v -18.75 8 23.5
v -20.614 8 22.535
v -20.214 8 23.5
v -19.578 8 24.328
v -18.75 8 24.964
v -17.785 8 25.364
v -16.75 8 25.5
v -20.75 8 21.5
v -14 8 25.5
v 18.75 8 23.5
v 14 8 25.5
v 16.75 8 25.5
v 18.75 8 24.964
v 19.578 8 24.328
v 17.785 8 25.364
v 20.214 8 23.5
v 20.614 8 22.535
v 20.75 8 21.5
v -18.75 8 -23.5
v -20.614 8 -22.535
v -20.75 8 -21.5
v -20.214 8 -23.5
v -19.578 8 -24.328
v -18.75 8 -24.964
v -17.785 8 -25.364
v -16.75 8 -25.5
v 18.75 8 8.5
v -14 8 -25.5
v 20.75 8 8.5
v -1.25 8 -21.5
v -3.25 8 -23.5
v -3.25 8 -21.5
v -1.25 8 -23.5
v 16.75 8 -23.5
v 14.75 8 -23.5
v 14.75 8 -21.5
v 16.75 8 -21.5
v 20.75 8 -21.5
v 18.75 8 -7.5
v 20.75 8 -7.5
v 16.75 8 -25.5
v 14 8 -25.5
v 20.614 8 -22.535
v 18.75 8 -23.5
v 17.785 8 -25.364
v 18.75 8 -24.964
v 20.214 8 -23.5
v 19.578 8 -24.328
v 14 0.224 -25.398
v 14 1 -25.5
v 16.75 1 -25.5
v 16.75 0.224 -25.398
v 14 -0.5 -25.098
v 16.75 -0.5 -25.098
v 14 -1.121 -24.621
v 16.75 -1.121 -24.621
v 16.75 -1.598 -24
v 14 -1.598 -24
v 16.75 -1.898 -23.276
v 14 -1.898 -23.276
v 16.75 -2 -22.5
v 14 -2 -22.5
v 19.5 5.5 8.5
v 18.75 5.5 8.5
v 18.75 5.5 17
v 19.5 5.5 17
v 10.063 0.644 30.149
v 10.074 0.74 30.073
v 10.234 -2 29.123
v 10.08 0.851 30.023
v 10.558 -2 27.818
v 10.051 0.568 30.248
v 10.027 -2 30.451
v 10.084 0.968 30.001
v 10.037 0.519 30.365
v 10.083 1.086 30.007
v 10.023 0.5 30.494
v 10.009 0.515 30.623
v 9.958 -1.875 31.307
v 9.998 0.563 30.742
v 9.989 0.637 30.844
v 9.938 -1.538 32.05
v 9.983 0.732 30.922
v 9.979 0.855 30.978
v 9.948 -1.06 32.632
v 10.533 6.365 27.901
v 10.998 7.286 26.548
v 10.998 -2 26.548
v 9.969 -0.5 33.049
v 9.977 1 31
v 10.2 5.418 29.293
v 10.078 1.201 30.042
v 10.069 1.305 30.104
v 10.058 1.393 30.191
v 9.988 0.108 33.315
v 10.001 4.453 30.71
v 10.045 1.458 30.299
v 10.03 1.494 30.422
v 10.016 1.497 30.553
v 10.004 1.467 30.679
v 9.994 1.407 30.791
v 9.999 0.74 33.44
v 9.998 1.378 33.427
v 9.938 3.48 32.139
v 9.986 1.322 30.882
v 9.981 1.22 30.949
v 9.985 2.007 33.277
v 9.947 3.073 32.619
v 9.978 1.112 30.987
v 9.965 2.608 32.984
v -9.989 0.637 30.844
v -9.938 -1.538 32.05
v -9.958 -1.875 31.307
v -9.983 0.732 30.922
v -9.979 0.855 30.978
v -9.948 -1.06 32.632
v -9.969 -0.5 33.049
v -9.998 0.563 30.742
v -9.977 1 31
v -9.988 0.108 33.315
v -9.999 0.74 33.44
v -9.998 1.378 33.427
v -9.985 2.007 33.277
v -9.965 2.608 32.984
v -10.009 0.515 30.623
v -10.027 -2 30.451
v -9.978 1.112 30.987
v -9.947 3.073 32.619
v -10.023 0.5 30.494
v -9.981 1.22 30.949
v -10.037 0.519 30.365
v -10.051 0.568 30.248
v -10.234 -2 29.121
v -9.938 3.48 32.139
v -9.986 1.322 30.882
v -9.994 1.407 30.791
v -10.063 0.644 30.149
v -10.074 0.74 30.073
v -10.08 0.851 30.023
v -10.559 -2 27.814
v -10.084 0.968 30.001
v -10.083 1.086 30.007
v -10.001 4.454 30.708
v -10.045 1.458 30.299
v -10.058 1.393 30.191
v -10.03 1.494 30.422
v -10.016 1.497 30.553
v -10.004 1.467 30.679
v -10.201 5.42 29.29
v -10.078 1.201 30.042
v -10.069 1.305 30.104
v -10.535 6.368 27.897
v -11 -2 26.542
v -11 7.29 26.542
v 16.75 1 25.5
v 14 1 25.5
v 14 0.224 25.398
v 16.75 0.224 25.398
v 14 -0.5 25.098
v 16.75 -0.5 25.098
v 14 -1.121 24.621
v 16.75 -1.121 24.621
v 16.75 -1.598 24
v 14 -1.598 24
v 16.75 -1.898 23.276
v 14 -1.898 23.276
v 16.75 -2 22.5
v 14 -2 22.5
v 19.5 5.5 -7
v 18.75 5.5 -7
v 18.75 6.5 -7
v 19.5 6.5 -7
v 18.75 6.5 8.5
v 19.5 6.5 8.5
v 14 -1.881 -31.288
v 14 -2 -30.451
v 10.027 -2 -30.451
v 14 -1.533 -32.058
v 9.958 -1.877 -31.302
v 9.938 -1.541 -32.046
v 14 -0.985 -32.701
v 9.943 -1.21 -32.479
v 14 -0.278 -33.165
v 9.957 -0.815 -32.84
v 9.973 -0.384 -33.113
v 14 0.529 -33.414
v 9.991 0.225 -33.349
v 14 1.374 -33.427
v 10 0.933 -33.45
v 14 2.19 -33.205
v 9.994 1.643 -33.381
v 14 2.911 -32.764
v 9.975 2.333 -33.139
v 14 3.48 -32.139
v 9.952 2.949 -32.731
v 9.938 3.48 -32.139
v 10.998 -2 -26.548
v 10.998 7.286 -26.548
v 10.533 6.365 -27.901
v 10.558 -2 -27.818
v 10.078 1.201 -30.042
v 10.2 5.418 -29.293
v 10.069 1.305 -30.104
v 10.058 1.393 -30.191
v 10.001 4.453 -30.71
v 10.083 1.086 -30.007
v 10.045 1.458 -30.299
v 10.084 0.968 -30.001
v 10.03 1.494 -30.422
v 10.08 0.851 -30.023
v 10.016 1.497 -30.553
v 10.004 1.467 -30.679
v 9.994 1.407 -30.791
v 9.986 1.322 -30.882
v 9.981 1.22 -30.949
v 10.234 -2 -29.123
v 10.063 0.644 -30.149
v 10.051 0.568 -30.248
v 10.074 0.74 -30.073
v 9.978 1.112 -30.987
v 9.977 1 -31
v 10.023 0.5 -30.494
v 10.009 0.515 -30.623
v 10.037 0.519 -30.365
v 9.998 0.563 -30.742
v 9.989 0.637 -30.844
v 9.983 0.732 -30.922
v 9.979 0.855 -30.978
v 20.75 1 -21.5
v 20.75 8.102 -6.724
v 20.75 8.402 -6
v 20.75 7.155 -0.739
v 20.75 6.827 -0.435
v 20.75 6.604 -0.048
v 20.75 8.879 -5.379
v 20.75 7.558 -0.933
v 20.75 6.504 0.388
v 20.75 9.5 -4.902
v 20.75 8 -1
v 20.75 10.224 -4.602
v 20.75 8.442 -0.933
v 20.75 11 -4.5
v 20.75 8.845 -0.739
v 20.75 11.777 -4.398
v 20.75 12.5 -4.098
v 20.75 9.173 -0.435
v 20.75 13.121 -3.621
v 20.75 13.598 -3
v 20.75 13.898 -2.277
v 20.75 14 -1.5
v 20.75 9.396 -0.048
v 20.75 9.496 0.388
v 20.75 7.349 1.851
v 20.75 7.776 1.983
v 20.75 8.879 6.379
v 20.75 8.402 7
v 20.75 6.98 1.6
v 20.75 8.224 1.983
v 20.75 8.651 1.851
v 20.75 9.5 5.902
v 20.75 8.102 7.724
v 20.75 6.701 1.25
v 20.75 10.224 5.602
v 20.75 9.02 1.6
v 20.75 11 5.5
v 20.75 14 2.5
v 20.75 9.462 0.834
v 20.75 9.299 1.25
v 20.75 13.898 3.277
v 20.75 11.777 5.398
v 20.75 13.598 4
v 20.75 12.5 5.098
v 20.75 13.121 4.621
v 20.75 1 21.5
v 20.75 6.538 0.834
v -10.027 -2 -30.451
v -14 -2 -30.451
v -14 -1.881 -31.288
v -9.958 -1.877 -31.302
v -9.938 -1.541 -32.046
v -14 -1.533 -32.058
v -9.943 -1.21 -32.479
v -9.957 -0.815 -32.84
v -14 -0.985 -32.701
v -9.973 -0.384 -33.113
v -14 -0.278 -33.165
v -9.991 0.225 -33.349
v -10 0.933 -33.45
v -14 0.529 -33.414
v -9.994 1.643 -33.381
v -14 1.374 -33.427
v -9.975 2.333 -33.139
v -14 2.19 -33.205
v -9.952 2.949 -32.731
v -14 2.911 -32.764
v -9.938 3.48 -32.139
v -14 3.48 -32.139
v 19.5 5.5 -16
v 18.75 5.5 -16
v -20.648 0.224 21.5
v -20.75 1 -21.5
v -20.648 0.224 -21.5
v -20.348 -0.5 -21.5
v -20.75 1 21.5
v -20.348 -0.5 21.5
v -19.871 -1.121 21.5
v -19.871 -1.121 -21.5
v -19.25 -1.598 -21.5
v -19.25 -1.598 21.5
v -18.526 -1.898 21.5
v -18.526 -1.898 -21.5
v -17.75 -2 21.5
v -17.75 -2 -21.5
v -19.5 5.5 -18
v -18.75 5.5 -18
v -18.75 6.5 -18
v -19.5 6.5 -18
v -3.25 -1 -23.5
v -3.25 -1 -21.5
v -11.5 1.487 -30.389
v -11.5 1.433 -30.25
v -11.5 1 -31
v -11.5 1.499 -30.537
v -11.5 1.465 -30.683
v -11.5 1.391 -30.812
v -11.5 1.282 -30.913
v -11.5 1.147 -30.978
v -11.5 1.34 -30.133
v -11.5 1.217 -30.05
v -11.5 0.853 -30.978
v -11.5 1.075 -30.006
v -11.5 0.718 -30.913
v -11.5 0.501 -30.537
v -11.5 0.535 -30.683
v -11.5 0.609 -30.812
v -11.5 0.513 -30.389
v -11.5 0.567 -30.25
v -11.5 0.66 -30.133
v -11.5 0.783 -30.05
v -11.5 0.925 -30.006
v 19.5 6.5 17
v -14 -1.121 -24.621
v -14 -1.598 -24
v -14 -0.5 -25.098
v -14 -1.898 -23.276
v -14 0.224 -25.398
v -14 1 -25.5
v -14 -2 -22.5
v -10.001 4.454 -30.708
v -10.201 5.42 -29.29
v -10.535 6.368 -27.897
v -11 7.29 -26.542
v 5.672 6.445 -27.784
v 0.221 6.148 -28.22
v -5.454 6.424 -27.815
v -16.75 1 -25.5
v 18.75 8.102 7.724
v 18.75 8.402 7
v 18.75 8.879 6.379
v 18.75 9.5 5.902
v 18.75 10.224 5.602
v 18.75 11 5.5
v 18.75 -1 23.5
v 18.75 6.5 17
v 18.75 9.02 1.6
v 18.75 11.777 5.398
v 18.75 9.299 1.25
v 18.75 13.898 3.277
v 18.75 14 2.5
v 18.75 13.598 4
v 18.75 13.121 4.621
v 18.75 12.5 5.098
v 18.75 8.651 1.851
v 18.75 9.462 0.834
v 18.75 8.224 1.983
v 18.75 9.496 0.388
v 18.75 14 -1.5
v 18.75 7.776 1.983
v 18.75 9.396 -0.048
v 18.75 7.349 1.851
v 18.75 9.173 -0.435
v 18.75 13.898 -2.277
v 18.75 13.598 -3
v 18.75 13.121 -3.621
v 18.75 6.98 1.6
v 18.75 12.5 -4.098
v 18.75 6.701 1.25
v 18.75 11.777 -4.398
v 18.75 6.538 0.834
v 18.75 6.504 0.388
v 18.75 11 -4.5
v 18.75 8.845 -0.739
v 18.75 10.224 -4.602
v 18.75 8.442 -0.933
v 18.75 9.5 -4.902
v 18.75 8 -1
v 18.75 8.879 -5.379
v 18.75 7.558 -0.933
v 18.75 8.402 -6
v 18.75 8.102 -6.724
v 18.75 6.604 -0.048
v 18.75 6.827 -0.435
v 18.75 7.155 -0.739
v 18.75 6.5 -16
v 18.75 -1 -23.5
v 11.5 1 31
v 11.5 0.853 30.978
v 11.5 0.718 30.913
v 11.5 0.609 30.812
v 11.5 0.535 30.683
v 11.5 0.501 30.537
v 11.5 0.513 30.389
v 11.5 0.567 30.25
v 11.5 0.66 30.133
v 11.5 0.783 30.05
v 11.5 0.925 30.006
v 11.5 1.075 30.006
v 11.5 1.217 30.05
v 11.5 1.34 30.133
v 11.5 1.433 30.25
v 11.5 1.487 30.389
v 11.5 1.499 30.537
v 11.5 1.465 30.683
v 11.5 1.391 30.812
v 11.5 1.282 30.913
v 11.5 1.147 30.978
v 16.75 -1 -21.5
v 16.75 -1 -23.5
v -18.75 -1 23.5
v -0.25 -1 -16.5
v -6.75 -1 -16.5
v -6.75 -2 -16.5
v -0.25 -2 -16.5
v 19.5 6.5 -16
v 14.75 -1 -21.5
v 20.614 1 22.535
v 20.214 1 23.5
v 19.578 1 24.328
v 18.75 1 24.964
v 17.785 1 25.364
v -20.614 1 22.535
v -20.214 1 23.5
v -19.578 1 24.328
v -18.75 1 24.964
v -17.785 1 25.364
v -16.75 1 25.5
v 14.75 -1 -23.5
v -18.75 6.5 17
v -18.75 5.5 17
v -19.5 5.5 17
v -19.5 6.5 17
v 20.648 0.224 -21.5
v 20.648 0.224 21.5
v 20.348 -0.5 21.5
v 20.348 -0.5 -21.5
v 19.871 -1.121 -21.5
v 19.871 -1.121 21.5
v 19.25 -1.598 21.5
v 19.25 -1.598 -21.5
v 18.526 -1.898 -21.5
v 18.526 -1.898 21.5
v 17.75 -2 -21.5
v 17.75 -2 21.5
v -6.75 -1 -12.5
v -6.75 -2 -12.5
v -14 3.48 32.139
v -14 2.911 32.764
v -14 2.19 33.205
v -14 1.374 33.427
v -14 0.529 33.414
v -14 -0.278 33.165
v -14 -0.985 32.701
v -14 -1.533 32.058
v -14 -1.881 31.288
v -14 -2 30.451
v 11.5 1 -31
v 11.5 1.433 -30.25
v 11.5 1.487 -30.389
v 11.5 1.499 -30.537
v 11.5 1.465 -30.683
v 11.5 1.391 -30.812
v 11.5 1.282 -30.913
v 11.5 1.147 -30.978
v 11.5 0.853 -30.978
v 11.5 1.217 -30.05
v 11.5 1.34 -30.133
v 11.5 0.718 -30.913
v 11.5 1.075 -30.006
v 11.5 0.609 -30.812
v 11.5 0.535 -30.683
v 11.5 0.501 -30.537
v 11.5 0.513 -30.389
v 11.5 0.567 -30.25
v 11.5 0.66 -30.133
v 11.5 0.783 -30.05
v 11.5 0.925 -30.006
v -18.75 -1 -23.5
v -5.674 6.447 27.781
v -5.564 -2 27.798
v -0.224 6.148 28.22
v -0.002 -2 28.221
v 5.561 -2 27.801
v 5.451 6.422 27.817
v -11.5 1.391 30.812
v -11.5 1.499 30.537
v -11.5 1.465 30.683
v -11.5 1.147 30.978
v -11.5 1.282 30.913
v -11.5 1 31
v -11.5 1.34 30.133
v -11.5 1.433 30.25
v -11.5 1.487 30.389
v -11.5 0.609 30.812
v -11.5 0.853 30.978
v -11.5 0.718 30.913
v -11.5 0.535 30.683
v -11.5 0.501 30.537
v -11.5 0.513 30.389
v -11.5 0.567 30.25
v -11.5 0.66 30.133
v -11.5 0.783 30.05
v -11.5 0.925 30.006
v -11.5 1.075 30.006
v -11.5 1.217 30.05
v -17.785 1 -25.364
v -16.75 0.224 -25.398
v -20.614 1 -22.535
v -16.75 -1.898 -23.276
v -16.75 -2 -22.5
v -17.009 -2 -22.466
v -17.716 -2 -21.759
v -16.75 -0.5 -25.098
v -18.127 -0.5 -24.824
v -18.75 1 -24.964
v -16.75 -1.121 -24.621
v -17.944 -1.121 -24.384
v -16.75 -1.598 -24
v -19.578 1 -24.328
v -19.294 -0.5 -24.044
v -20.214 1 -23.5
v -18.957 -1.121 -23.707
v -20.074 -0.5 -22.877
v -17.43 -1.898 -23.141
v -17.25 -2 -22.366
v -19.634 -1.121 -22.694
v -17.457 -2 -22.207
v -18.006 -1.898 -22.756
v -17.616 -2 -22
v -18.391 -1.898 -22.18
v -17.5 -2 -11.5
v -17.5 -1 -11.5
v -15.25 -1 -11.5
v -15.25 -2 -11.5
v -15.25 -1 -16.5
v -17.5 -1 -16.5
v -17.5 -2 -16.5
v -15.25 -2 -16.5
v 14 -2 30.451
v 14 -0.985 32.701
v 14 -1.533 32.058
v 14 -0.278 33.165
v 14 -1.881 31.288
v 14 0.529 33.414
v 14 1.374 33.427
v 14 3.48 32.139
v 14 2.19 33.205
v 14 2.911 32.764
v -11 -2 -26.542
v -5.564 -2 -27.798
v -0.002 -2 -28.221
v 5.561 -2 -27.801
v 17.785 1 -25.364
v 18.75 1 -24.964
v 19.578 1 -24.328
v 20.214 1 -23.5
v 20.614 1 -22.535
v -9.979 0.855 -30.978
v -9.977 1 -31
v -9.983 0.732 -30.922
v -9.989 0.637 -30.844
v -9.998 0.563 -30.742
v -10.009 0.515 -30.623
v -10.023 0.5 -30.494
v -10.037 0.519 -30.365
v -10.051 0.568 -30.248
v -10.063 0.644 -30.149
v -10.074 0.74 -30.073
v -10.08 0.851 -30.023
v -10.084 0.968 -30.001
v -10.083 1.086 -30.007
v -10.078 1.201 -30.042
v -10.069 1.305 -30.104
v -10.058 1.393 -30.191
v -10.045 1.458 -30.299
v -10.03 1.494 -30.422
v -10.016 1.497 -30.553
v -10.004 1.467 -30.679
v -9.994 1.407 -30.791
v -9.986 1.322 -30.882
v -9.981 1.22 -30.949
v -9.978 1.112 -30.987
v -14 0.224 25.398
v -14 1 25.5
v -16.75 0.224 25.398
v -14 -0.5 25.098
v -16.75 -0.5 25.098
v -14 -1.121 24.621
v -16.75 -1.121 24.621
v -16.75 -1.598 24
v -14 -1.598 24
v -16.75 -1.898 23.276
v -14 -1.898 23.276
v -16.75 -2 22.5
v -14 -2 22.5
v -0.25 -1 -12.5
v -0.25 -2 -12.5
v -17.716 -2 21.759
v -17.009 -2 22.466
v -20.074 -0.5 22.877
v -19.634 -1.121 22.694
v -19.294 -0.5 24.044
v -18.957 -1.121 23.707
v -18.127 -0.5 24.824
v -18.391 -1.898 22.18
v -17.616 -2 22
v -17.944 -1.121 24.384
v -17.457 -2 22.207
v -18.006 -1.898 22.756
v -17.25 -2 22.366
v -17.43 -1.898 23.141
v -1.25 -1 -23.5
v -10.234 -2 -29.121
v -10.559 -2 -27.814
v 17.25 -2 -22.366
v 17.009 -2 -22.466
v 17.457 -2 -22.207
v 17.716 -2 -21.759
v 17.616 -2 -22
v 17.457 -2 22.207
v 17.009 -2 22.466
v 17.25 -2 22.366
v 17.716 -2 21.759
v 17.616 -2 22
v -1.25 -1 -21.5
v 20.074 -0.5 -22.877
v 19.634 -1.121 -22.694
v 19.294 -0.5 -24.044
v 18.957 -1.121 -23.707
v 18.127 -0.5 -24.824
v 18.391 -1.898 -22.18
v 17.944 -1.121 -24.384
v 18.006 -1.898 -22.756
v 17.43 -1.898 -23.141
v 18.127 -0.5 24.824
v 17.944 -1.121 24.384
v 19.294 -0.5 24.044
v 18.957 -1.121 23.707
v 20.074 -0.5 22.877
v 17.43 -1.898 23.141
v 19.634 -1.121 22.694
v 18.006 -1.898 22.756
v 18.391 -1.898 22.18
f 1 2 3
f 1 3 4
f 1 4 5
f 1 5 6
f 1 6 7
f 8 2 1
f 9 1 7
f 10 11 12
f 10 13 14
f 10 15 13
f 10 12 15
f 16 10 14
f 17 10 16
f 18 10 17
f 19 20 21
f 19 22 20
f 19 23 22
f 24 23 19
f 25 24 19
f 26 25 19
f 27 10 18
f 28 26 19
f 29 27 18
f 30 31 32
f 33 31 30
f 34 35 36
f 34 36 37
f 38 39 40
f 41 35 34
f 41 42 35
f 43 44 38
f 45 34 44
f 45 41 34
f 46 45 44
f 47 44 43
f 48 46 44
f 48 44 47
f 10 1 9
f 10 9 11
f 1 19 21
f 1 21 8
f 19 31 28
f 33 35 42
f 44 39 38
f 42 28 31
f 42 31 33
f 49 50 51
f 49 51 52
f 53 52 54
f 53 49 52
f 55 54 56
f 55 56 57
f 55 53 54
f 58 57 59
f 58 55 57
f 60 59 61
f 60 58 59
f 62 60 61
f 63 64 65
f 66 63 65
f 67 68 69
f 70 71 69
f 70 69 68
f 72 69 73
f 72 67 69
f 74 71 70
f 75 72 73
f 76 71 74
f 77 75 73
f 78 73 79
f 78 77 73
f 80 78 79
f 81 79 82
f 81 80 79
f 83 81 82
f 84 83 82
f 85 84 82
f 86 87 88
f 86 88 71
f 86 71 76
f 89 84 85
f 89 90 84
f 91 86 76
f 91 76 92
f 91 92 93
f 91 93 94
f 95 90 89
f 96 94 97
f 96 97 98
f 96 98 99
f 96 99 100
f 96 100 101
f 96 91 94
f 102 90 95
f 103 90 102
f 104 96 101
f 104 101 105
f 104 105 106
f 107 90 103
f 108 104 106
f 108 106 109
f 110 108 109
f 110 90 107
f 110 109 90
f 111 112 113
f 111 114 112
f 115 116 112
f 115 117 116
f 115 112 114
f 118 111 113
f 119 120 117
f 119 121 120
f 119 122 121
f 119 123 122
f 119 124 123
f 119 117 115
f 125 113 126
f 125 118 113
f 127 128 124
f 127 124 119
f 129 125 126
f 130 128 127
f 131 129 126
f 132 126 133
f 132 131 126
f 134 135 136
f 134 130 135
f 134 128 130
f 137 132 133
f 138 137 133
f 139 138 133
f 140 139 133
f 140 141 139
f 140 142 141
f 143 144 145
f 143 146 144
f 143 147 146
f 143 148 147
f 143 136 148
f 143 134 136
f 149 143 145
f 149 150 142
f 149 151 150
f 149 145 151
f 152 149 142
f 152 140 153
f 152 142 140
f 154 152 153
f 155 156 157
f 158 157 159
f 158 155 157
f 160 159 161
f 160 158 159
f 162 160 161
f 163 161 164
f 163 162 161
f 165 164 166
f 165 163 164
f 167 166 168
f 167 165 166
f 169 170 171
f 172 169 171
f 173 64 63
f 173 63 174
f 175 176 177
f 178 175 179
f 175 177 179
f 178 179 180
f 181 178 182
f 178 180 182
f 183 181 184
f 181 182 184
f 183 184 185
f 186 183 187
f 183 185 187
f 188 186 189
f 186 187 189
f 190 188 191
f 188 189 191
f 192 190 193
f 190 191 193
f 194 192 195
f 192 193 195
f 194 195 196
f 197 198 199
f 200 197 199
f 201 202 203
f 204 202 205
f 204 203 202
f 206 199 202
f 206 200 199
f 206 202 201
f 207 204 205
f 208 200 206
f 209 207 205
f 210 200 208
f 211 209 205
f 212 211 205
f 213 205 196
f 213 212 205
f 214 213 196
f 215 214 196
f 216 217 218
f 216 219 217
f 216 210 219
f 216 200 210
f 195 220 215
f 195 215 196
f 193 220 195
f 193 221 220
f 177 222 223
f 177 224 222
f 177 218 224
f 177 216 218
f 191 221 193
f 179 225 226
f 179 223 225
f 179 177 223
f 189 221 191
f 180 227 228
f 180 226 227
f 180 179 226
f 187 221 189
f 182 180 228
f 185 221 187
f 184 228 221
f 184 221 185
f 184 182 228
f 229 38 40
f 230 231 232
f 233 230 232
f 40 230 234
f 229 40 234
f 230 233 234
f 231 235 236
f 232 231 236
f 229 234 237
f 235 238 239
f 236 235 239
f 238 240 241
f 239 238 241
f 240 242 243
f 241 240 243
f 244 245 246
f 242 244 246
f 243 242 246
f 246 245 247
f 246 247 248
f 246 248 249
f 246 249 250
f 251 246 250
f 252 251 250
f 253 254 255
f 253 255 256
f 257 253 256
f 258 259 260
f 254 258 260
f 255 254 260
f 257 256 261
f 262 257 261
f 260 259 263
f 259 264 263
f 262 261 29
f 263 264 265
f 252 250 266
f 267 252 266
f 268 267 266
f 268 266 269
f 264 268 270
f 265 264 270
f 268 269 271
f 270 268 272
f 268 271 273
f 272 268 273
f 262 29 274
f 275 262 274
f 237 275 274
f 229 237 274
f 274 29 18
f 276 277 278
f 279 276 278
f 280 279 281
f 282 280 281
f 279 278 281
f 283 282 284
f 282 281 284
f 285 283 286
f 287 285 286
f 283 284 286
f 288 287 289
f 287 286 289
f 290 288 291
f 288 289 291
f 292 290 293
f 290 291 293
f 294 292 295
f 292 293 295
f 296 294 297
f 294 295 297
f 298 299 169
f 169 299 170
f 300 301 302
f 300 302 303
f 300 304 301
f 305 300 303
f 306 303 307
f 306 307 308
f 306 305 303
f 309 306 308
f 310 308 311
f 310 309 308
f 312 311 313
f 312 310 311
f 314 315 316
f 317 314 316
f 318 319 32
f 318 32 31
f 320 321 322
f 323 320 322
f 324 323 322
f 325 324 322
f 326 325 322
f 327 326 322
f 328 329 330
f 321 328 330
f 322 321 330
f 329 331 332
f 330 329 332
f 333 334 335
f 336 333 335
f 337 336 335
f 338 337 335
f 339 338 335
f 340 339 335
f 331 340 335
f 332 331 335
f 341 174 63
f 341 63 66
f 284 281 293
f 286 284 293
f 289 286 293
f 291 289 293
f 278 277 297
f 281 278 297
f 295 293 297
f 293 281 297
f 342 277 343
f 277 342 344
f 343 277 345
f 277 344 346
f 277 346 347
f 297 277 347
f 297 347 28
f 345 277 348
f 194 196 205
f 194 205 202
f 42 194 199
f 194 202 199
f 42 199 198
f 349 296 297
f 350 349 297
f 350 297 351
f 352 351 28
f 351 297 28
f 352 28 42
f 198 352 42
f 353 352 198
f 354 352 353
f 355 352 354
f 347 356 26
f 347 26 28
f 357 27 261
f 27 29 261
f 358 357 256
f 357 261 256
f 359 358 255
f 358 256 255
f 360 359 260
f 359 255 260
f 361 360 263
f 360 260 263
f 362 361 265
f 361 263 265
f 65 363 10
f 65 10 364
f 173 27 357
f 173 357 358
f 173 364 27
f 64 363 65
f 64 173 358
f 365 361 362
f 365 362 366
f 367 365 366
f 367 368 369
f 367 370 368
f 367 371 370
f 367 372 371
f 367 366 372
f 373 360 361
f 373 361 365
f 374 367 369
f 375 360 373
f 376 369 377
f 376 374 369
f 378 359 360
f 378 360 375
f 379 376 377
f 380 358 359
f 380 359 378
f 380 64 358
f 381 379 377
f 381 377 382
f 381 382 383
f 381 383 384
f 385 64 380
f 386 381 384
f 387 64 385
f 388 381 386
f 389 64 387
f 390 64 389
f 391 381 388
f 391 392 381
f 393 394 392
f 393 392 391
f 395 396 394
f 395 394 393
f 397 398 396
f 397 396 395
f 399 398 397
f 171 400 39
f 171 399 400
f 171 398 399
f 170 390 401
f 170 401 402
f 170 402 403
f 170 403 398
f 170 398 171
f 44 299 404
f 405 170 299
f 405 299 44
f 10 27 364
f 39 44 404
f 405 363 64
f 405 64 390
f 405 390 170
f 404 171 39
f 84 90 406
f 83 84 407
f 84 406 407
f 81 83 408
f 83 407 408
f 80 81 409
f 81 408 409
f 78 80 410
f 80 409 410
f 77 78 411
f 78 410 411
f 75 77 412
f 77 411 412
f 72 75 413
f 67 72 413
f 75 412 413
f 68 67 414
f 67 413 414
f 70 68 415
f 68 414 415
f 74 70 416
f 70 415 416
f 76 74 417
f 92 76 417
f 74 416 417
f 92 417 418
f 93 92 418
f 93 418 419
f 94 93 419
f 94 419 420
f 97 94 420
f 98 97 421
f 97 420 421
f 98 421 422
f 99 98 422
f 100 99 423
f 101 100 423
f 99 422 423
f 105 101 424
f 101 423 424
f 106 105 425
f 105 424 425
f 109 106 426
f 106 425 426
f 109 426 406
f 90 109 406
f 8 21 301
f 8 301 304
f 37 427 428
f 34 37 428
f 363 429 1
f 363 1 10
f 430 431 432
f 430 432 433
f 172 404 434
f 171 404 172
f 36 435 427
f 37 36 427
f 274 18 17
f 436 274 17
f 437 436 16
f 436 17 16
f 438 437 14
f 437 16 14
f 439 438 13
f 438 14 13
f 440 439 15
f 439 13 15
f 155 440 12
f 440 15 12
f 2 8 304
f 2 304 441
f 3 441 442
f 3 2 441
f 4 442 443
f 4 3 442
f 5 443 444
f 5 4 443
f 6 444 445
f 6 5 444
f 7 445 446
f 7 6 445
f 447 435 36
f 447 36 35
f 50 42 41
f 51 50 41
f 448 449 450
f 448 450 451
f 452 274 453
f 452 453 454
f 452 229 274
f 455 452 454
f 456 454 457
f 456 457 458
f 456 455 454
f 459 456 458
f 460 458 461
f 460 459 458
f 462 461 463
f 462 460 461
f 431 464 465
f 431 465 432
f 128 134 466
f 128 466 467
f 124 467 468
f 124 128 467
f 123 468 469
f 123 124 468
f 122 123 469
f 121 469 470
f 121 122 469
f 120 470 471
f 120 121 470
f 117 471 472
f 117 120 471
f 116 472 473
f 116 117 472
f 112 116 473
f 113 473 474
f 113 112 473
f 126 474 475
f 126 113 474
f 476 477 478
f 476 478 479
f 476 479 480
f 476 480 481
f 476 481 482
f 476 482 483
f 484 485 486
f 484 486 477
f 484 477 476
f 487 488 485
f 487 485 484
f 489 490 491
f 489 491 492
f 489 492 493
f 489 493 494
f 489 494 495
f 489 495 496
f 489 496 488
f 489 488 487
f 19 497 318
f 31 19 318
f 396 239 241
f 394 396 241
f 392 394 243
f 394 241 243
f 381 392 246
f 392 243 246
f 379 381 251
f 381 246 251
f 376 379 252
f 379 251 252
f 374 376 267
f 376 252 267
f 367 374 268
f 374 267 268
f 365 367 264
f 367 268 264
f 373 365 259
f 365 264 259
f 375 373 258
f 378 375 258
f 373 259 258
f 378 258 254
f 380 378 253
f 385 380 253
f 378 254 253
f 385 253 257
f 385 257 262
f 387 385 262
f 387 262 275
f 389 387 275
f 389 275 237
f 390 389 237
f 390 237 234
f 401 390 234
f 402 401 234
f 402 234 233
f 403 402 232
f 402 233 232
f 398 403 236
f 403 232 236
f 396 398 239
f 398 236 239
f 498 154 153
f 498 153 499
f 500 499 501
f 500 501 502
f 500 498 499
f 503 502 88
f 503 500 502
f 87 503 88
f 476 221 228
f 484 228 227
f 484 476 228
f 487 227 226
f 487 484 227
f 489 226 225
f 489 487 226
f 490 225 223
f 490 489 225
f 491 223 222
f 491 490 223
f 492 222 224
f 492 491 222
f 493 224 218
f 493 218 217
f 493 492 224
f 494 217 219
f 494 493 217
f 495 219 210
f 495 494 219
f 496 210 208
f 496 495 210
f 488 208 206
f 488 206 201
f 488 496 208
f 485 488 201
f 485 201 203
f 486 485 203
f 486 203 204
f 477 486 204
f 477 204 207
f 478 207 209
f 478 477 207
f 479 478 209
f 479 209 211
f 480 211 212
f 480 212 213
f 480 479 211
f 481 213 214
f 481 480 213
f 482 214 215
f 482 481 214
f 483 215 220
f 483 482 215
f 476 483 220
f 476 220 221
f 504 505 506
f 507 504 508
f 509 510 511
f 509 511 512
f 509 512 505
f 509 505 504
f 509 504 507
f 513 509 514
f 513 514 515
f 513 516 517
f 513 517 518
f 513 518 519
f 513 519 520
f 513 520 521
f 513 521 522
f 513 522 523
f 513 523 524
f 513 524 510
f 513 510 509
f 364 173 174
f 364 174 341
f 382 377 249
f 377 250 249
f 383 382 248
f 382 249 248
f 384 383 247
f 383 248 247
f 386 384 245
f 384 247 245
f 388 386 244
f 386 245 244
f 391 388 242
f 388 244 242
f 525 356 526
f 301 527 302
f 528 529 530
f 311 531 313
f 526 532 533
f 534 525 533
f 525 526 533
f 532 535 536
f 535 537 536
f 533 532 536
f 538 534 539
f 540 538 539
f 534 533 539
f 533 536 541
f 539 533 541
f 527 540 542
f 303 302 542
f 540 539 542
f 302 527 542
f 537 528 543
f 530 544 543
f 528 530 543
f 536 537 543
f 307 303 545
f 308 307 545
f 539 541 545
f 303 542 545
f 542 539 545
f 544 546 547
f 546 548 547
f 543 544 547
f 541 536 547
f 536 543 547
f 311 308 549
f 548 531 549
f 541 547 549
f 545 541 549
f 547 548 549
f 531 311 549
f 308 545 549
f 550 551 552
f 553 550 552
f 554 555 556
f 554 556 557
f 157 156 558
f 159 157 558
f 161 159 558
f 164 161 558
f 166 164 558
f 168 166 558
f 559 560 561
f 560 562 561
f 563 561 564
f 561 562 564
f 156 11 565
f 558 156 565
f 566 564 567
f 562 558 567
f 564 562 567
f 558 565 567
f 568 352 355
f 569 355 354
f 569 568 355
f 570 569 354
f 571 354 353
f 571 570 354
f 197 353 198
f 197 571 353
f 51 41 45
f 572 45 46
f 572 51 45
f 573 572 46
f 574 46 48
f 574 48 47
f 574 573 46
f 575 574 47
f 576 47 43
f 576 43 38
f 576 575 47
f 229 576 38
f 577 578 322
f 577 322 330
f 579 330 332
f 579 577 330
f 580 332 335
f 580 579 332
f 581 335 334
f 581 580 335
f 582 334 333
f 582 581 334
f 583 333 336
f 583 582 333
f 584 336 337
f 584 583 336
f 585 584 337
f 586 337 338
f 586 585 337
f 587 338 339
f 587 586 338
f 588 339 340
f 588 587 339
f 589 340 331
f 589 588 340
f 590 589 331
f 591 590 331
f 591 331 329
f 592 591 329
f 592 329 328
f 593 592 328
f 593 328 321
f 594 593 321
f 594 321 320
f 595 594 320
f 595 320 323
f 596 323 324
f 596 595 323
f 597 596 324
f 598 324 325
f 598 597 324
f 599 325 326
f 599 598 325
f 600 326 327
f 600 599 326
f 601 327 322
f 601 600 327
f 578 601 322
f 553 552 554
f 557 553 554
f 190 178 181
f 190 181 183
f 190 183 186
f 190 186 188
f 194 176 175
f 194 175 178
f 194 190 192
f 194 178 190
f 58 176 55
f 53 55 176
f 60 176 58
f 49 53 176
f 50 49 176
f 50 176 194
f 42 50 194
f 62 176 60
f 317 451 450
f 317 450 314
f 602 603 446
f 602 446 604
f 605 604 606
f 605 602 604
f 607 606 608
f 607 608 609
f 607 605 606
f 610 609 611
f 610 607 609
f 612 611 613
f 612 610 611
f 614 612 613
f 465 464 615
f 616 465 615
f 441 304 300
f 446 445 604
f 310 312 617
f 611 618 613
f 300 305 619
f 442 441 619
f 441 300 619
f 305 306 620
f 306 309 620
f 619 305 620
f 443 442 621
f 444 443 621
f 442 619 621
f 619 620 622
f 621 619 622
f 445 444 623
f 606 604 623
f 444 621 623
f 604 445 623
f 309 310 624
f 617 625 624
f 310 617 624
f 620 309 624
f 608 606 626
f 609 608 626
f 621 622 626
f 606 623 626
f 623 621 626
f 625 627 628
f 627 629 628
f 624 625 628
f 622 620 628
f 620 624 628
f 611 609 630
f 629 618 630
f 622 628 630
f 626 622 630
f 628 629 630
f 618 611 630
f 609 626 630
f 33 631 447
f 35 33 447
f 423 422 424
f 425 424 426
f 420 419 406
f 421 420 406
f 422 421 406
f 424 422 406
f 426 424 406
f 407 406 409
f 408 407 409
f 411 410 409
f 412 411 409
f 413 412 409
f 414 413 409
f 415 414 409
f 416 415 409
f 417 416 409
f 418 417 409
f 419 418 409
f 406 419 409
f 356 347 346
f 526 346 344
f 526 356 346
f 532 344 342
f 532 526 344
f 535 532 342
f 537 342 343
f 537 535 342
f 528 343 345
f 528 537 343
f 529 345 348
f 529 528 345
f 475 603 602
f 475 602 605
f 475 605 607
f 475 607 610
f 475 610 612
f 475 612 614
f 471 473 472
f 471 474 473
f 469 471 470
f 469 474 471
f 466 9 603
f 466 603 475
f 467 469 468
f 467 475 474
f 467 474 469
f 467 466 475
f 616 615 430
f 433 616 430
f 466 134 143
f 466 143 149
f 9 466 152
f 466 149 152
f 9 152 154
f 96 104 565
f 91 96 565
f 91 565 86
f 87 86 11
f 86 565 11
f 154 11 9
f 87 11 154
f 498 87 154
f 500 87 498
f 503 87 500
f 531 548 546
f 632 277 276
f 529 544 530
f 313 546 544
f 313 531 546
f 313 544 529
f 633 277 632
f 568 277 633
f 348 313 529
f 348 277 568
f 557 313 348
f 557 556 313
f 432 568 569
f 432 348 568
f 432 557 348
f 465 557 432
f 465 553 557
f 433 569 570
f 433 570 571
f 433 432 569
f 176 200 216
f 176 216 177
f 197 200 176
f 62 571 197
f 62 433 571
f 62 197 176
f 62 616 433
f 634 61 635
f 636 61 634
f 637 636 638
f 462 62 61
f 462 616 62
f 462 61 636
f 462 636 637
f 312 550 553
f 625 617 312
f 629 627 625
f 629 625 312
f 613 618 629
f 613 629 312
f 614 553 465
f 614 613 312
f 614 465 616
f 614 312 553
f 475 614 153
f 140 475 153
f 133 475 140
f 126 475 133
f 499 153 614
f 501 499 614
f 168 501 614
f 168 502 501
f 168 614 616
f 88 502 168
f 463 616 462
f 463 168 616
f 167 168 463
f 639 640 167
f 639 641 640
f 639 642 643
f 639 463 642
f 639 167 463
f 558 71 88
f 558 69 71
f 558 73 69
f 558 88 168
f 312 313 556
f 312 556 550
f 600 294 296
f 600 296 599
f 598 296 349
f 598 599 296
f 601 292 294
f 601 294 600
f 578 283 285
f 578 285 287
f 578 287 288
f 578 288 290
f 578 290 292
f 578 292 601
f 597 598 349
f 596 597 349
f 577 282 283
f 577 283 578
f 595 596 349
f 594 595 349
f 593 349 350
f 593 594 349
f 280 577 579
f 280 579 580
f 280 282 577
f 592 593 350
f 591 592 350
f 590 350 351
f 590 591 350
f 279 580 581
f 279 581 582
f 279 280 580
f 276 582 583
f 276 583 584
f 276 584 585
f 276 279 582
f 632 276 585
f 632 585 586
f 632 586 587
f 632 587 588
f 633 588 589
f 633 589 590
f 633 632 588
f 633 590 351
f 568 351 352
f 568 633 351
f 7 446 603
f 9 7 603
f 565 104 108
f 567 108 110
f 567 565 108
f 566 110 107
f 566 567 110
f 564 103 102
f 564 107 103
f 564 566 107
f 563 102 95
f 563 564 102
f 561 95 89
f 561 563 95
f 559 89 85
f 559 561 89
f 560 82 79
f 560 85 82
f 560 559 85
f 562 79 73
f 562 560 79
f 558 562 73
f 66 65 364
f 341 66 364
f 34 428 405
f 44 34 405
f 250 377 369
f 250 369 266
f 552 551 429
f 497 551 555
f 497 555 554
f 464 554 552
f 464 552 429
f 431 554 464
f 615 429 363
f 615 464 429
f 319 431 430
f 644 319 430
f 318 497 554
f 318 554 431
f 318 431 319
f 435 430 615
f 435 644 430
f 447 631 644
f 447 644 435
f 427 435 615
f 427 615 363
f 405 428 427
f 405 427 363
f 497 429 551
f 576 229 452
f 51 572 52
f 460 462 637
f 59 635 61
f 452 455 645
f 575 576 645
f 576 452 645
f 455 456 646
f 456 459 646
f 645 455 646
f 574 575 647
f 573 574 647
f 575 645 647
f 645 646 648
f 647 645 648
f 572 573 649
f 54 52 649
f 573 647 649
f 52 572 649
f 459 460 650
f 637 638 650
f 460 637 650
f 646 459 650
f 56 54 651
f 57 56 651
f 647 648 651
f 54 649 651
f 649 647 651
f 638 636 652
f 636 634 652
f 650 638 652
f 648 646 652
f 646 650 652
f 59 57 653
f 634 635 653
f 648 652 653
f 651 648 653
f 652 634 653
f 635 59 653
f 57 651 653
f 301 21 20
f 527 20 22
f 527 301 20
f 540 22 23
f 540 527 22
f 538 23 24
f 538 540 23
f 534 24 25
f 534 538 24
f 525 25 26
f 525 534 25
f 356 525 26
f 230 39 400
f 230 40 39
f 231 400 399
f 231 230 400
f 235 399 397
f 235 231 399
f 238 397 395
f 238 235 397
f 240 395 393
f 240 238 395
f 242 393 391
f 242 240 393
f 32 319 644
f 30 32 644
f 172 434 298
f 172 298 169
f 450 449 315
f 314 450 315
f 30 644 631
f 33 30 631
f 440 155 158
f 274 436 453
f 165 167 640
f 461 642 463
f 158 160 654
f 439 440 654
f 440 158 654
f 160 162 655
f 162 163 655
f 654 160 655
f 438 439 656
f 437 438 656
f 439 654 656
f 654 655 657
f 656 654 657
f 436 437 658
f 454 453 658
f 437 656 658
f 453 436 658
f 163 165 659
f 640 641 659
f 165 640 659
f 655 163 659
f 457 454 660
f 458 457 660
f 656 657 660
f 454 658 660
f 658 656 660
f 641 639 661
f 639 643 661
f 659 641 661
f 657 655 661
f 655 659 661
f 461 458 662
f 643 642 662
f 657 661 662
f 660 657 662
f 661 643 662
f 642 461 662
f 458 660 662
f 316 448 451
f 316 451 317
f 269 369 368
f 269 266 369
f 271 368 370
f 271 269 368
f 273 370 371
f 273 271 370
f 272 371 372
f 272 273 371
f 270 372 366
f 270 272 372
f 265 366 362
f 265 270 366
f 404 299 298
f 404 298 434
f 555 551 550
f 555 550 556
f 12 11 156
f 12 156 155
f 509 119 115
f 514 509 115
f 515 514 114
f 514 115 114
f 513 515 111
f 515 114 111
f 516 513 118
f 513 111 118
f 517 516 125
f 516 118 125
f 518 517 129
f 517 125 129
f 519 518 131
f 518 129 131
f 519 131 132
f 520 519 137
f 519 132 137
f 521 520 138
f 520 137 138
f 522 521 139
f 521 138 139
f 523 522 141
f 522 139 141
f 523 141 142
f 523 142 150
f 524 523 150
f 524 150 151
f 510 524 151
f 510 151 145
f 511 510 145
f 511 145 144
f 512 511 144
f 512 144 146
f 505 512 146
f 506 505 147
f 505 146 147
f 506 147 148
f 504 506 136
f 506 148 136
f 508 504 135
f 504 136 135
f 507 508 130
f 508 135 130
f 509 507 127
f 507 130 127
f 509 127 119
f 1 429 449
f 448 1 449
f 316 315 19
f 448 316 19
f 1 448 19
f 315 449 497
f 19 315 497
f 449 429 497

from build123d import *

# Parameters (mm, degrees)
SKETCH1_W            = 41.5
SKETCH1_H            = 51
SKETCH1_W_2          = 37.5
SKETCH1_H_2          = 47
BOSS_EXTRUDE1_DEPTH  = 8
SKETCH2_W            = 41.5
SKETCH2_H            = 51
BOSS_EXTRUDE2_DEPTH  = 2
FILLET1_R            = 4
FILLET2_R            = 3
SKETCH3_W            = 5.5
SKETCH3_H            = 20
BOSS_EXTRUDE3_DEPTH  = 6
SKETCH4_R            = 1.4
BOSS_EXTRUDE4_DEPTH  = 3.5
FILLET3_R            = 0.5
SKETCH5_W            = 6.5
SKETCH5_H            = 4
CUT_EXTRUDE1_DEPTH   = 34.835077952
SKETCH6_W            = 2
SKETCH6_H            = 10
BOSS_EXTRUDE6_DEPTH  = 6
FILLET4_R            = 3
SKETCH7_R            = 1.5
CUT_EXTRUDE2_DEPTH   = 2
SKETCH8_W            = 35
SKETCH8_H            = 1
CUT_EXTRUDE3_DEPTH   = 0.75
SKETCH9_W            = 9
SKETCH9_H            = 1
SKETCH9_W_2          = 8.5
CUT_EXTRUDE4_DEPTH   = 0.75
BOSS_EXTRUDE7_DEPTH  = 14
FILLET6_R            = 3
CUT_EXTRUDE5_DEPTH   = 42.779440692
MIRROR1_START        = 10.997748531
MIRROR1_DEPTH        = 3.002251469
MIRROR1_START_2      = -14
MIRROR1_2_DEPTH      = 2.9999999
MIRROR1_START_3      = -11.0000001
MIRROR1_3_DEPTH      = 21.997748631
MIRROR1_START_4      = -3
MIRROR1_4_DEPTH      = 10.290302021
SKETCH13_R           = 0.5
CUT_EXTRUDE6_DEPTH   = 11.5
CUT_EXTRUDE7_DEPTH   = 6
SKETCH15_W           = 4.2
SKETCH15_H           = 10.25
CUT_EXTRUDE8_DEPTH   = 42.779440772
SKETCH16_R           = 1.75
SKETCH16_R_2         = 0.5
BOSS_EXTRUDE8_DEPTH  = 3
CUT_EXTRUDE9_START   = -1
SKETCH17_W           = 37.5
SKETCH17_H           = 47
SKETCH17_R           = 1.75
SKETCH17_R_2         = 1.4
SKETCH17_W_2         = 4.2
SKETCH17_H_2         = 10.25
SKETCH17_W_3         = 6.5
SKETCH17_H_3         = 4
CUT_EXTRUDE9_DEPTH   = 1
CUT_EXTRUDE10_START  = -4.5
SKETCH18_R           = 1.4
CUT_EXTRUDE10_DEPTH  = 4.5
SKETCH19_W           = 4.2
SKETCH19_H           = 10.25
BOSS_EXTRUDE9_DEPTH  = 1
CUT_EXTRUDE11_START  = -4
SKETCH20_R           = 1.75
CUT_EXTRUDE11_DEPTH  = 4
SKETCH23_W           = 2.25
SKETCH23_H           = 5
CUT_EXTRUDE12_DEPTH  = 43.125071765
SKETCH26_W           = 2
SKETCH26_H           = 2
BOSS_EXTRUDE10_DEPTH = 9


with BuildPart() as part:
    # Sketch1 → Boss-Extrude1 (new body)
    with BuildSketch(Plane(origin=(0, 0, 0), x_dir=(1, 0, 0), z_dir=(0, 1, 0))):
        Rectangle(SKETCH1_W, SKETCH1_H)
        Rectangle(SKETCH1_W_2, SKETCH1_H_2, mode=Mode.SUBTRACT)
    extrude(amount=BOSS_EXTRUDE1_DEPTH)

    # Sketch2 → Boss-Extrude2 (add)
    with BuildSketch(Plane.XZ):
        Rectangle(SKETCH2_W, SKETCH2_H)
    extrude(amount=BOSS_EXTRUDE2_DEPTH)

    # Fillet1
    fillet1_edges = [part.edges().sort_by_distance(p)[0] for p in [
        (20.75, 3, -25.5),
        (20.75, 3, 25.5),
        (-20.75, 3, 25.5),
        (-20.75, 3, -25.5),
    ]]
    fillet(fillet1_edges, radius=FILLET1_R)

    # Fillet2
    fillet2_edges = [part.edges().sort_by_distance(p)[0] for p in [
        (-20.75, -2, 0),
        (0, -2, -25.5),
        (20.75, -2, 0),
        (0, -2, 25.5),
        (19.578427125, -2, -24.328427125),
        (19.578427125, -2, 24.328427125),
        (-19.578427125, -2, 24.328427125),
        (-19.578427125, -2, -24.328427125),
    ]]
    fillet(fillet2_edges, radius=FILLET2_R)

    # Sketch3 → Boss-Extrude3 (add)
    with BuildSketch(Plane(origin=(0, 0, 0), x_dir=(1, 0, 0), z_dir=(0, 1, 0))):
        with Locations((16, 13.5)):
            Rectangle(SKETCH3_W, SKETCH3_H)
    extrude(amount=BOSS_EXTRUDE3_DEPTH)

    # Sketch4 → Boss-Extrude4 (add)
    with BuildSketch(Plane(origin=(0, 0, 0), x_dir=(1, 0, 0), z_dir=(0, 1, 0))):
        with Locations(Location((0.245140852, 21.1, 0), (0, 0, 90))):
            Circle(SKETCH4_R)
        with Locations(Location((0.245140852, 6.1, 0), (0, 0, 90))):
            Circle(SKETCH4_R)
    extrude(amount=BOSS_EXTRUDE4_DEPTH)

    # Fillet3
    fillet3_edges = [part.edges().sort_by_distance(p)[0] for p in [
        (0.245140852, 3.5, -19.7),
        (0.245140852, 3.5, -4.7),
    ]]
    fillet(fillet3_edges, radius=FILLET3_R)

    # Sketch5 → Cut-Extrude1 (cut, through all)
    with BuildSketch(Plane(origin=(0, 0, 0), x_dir=(1, 0, 0), z_dir=(0, 1, 0))):
        with Locations((-3.5, 14.5)):
            Rectangle(SKETCH5_W, SKETCH5_H)
    extrude(amount=-CUT_EXTRUDE1_DEPTH, mode=Mode.SUBTRACT)

    # Sketch6 → Boss-Extrude6 (add)
    with BuildSketch(Plane(origin=(0, 8, 0), x_dir=(1, 0, 0), z_dir=(0, 1, 0))):
        with Locations((19.75, -0.5)):
            Rectangle(SKETCH6_W, SKETCH6_H)
    extrude(amount=BOSS_EXTRUDE6_DEPTH)

    # Fillet4
    fillet4_edges = [part.edges().sort_by_distance(p)[0] for p in [
        (19.75, 8, -4.5),
    ]]
    fillet(fillet4_edges, radius=FILLET4_R)
    fillet4_2_edges = [part.edges().sort_by_distance(p)[0] for p in [
        (19.75, 8, 5.5),
    ]]
    fillet(fillet4_2_edges, radius=FILLET4_R)
    fillet4_3_edges = [part.edges().sort_by_distance(p)[0] for p in [
        (19.75, 14, -4.5),
    ]]
    fillet(fillet4_3_edges, radius=FILLET4_R - 0.0001)  # a hair under: the kernel refuses the full size
    fillet4_4_edges = [part.edges().sort_by_distance(p)[0] for p in [
        (19.75, 14, 5.5),
    ]]
    fillet(fillet4_4_edges, radius=FILLET4_R - 0.0001)  # a hair under: the kernel refuses the full size

    # Sketch7 → Cut-Extrude2 (cut)
    with BuildSketch(Plane(origin=(20.75, 0, 0), x_dir=(0, 0, -1), z_dir=(1, 0, 0))):
        with Locations((-0.5, 8)):
            Circle(SKETCH7_R)
    extrude(amount=-CUT_EXTRUDE2_DEPTH, mode=Mode.SUBTRACT)

    # Sketch8 → Cut-Extrude3 (cut)
    with BuildSketch(Plane(origin=(-18.75, 0, 0), x_dir=(0, 0, -1), z_dir=(1, 0, 0))):
        with Locations((0.5, 6)):
            Rectangle(SKETCH8_W, SKETCH8_H)
    extrude(amount=-CUT_EXTRUDE3_DEPTH, mode=Mode.SUBTRACT)

    # Sketch9 → Cut-Extrude4 (cut)
    with BuildSketch(Plane.ZY.offset(-18.75)):
        with Locations((-11.5, 6)):
            Rectangle(SKETCH9_W, SKETCH9_H)
        with Locations((12.75, 6)):
            Rectangle(SKETCH9_W_2, SKETCH9_H)
    extrude(amount=-CUT_EXTRUDE4_DEPTH, mode=Mode.SUBTRACT)

    # Sketch10 → Boss-Extrude7 (add, symmetric)
    with BuildSketch(Plane(origin=(0, 0, 0), x_dir=(0, 0, -1), z_dir=(1, 0, 0))):
        with BuildLine():
            Line((-40.187882415, -2), (-25.5, 8))
            Line((-25.5, 8), (-25.5, 1))
            ThreePointArc((-25.5, 1), (-24.621320344, -1.121320344), (-22.5, -2))
            Line((-22.5, -2), (-40.187882415, -2))
        make_face()
    extrude(amount=BOSS_EXTRUDE7_DEPTH, both=True)

    # Fillet6
    fillet6_edges = [part.edges().sort_by_distance(p)[0] for p in [
        (0, -2, 40.187882415),
    ]]
    fillet(fillet6_edges, radius=FILLET6_R)

    # Sketch12 → Cut-Extrude5 (cut, symmetric)
    with BuildSketch(Plane(origin=(0, 0, 0), x_dir=(1, 0, 0), z_dir=(0, 1, 0))):
        with BuildLine():
            ThreePointArc((-10, -33.450846993), (-10.0925407, -29.937641684), (-11, -26.542396046))
            ThreePointArc((-11, -26.542396046), (-0.001557097, -28.220686258), (10.997748531, -26.548059567))
            ThreePointArc((10.997748531, -26.548059567), (10.092104456, -29.940657614), (10, -33.450846993))
            ThreePointArc((10, -33.450846993), (0, -35.763467262), (-10, -33.450846993))
        make_face()
    extrude(amount=CUT_EXTRUDE5_DEPTH, both=True, mode=Mode.SUBTRACT)

    # Mirror1: read off the stored shape, not the designer's step
    # Mirror1 outline → Mirror1 (add)
    with BuildSketch(Plane.YZ.offset(MIRROR1_START)):
        with BuildLine():
            ThreePointArc((1, -25.5), (-1.121320344, -24.621320344), (-2, -22.5))
            Line((-2, -22.5), (-2, -30.450846993))
            ThreePointArc((-2, -30.450846993), (0.116669534, -33.31785367), (3.479818192, -32.139189888))
            Line((3.479818192, -32.139189888), (8, -25.5))
            Line((8, -25.5), (1, -25.5))
        make_face()
    extrude(amount=MIRROR1_DEPTH)

    # Mirror1 2 outline → Mirror1 2 (add)
    with BuildSketch(Plane.YZ.offset(MIRROR1_START_2)):
        with BuildLine():
            ThreePointArc((1, -25.5), (-1.121320344, -24.621320344), (-2, -22.5))
            Line((-2, -22.5), (-2, -30.450846993))
            ThreePointArc((-2, -30.450846993), (0.116669534, -33.31785367), (3.479818192, -32.139189888))
            Line((3.479818192, -32.139189888), (8, -25.5))
            Line((8, -25.5), (1, -25.5))
        make_face()
    extrude(amount=MIRROR1_2_DEPTH)

    # Mirror1 3 outline → Mirror1 3 (add)
    with BuildSketch(Plane.YZ.offset(MIRROR1_START_3)):
        with BuildLine():
            ThreePointArc((1.000000002, -25.5), (-1.121320344, -24.621320344), (-2, -22.499999998))
            Line((-2, -22.499999998), (-2, -30.450846993))
            ThreePointArc((-2, -30.450846993), (0.116669534, -33.31785367), (3.479818192, -32.139189888))
            Line((3.479818192, -32.139189888), (8, -25.5))
            Line((8, -25.5), (1.000000002, -25.5))
        make_face()
    extrude(amount=MIRROR1_3_DEPTH)

    # Mirror1 4 outline → Mirror1 4 (cut)
    with BuildSketch(Plane(origin=(0, 0, 0), x_dir=(1, 0, 0), z_dir=(0, 1, 0)).offset(MIRROR1_START_4)):
        with BuildLine():
            ThreePointArc((-11, 26.542396046), (-0.001557097, 28.220686258), (10.997748531, 26.548059567))
            ThreePointArc((10.997748531, 26.548059567), (10.092086007, 29.940785259), (10.000023464, 33.451103865))
            Line((10.000023464, 33.451103865), (10.141518844, 35))
            Line((10.141518844, 35), (-10.141519787, 35))
            Line((-10.141519787, 35), (-10.000024287, 33.451112878))
            ThreePointArc((-10.000024287, 33.451112878), (-10.092521576, 29.937773803), (-11, 26.542396046))
        make_face()
    extrude(amount=MIRROR1_4_DEPTH, mode=Mode.SUBTRACT)

    # Sketch13 → Cut-Extrude6 (cut, symmetric)
    with BuildSketch(Plane(origin=(0, 0, 0), x_dir=(0, 0, -1), z_dir=(1, 0, 0))):
        with Locations(Location((-30.5, 1, 0), (0, 0, 180))):
            Circle(SKETCH13_R)
    cut_extrude6 = extrude(amount=CUT_EXTRUDE6_DEPTH, both=True, mode=Mode.SUBTRACT)

    # Mirror2: Cut-Extrude6 across plane
    add(cut_extrude6.mirror(Plane.XY), mode=Mode.SUBTRACT)

    # Sketch14 → Cut-Extrude7 (cut)
    with BuildSketch(Plane(origin=(0, 6, 0), x_dir=(1, 0, 0), z_dir=(0, 1, 0))):
        Polygon((18.75, 23.5), (13.25, 23.5), (13.25, 3.5), (18.75, 3.5), (18.75, 7), (18.75, 16), align=None)
    extrude(amount=-CUT_EXTRUDE7_DEPTH, mode=Mode.SUBTRACT)

    # Sketch15 → Cut-Extrude8 (cut, through all)
    with BuildSketch(Plane(origin=(0, 0, 0), x_dir=(1, 0, 0), z_dir=(0, 1, 0))):
        with Locations((14.15, 13.375)):
            Rectangle(SKETCH15_W, SKETCH15_H)
    extrude(amount=-CUT_EXTRUDE8_DEPTH, mode=Mode.SUBTRACT)

    # Sketch16 → Boss-Extrude8 (add)
    with BuildSketch(Plane(origin=(0, 0, 0), x_dir=(1, 0, 0), z_dir=(0, 1, 0))):
        with Locations(Location((-16.25, 19.5, 0), (0, 0, 90))):
            Circle(SKETCH16_R)
        with Locations(Location((-16.25, 19.5, 0), (0, 0, 270))):
            Circle(SKETCH16_R_2, mode=Mode.SUBTRACT)
    extrude(amount=BOSS_EXTRUDE8_DEPTH)

    # Sketch17 → Cut-Extrude9 (cut)
    with BuildSketch(Plane(origin=(0, 0, 0), x_dir=(1, 0, 0), z_dir=(0, 1, 0)).offset(CUT_EXTRUDE9_START)):
        Rectangle(SKETCH17_W, SKETCH17_H)
        with Locations(Location((-16.25, 19.5, 0), (0, 0, 270))):
            Circle(SKETCH17_R, mode=Mode.SUBTRACT)
        with Locations(Location((0.245140852, 21.1, 0), (0, 0, 270))):
            Circle(SKETCH17_R_2, mode=Mode.SUBTRACT)
        with Locations(Location((0.245140852, 6.1, 0), (0, 0, 270))):
            Circle(SKETCH17_R_2, mode=Mode.SUBTRACT)
        with Locations((14.15, 13.375)):
            Rectangle(SKETCH17_W_2, SKETCH17_H_2, mode=Mode.SUBTRACT)
        with Locations((-3.5, 14.5)):
            Rectangle(SKETCH17_W_3, SKETCH17_H_3, mode=Mode.SUBTRACT)
    extrude(amount=CUT_EXTRUDE9_DEPTH, mode=Mode.SUBTRACT)

    # Sketch18 → Cut-Extrude10 (cut)
    with BuildSketch(Plane(origin=(0, 3.5, 0), x_dir=(1, 0, 0), z_dir=(0, 1, 0)).offset(CUT_EXTRUDE10_START)):
        with Locations((0.245140852, 21.1)):
            Circle(SKETCH18_R)
        with Locations((0.245140852, 6.1)):
            Circle(SKETCH18_R)
    extrude(amount=CUT_EXTRUDE10_DEPTH, mode=Mode.SUBTRACT)

    # Sketch19 → Boss-Extrude9 (add)
    with BuildSketch(Plane.XZ.offset(2)):
        with Locations((14.15, -13.375)):
            Rectangle(SKETCH19_W, SKETCH19_H)
    extrude(amount=-BOSS_EXTRUDE9_DEPTH)

    # Sketch20 → Cut-Extrude11 (cut)
    with BuildSketch(Plane(origin=(0, 3, 0), x_dir=(1, 0, 0), z_dir=(0, 1, 0)).offset(CUT_EXTRUDE11_START)):
        with Locations((-16.25, 19.5)):
            Circle(SKETCH20_R)
    extrude(amount=CUT_EXTRUDE11_DEPTH, mode=Mode.SUBTRACT)

    # Sketch23 → Cut-Extrude12 (cut, through all)
    with BuildSketch(Plane(origin=(0, -1, 0), x_dir=(1, 0, 0), z_dir=(0, 1, 0))):
        with Locations((-16.375, 14)):
            Rectangle(SKETCH23_W, SKETCH23_H)
    extrude(amount=-CUT_EXTRUDE12_DEPTH, mode=Mode.SUBTRACT)

    # Sketch26 → Boss-Extrude10 (add)
    with BuildSketch(Plane(origin=(0, -1, 0), x_dir=(1, 0, 0), z_dir=(0, 1, 0))):
        with Locations((-2.25, 22.5)):
            Rectangle(SKETCH26_W, SKETCH26_H)
        with Locations((15.75, 22.5)):
            Rectangle(SKETCH26_W, SKETCH26_H)
    extrude(amount=BOSS_EXTRUDE10_DEPTH)


solid = part.part
